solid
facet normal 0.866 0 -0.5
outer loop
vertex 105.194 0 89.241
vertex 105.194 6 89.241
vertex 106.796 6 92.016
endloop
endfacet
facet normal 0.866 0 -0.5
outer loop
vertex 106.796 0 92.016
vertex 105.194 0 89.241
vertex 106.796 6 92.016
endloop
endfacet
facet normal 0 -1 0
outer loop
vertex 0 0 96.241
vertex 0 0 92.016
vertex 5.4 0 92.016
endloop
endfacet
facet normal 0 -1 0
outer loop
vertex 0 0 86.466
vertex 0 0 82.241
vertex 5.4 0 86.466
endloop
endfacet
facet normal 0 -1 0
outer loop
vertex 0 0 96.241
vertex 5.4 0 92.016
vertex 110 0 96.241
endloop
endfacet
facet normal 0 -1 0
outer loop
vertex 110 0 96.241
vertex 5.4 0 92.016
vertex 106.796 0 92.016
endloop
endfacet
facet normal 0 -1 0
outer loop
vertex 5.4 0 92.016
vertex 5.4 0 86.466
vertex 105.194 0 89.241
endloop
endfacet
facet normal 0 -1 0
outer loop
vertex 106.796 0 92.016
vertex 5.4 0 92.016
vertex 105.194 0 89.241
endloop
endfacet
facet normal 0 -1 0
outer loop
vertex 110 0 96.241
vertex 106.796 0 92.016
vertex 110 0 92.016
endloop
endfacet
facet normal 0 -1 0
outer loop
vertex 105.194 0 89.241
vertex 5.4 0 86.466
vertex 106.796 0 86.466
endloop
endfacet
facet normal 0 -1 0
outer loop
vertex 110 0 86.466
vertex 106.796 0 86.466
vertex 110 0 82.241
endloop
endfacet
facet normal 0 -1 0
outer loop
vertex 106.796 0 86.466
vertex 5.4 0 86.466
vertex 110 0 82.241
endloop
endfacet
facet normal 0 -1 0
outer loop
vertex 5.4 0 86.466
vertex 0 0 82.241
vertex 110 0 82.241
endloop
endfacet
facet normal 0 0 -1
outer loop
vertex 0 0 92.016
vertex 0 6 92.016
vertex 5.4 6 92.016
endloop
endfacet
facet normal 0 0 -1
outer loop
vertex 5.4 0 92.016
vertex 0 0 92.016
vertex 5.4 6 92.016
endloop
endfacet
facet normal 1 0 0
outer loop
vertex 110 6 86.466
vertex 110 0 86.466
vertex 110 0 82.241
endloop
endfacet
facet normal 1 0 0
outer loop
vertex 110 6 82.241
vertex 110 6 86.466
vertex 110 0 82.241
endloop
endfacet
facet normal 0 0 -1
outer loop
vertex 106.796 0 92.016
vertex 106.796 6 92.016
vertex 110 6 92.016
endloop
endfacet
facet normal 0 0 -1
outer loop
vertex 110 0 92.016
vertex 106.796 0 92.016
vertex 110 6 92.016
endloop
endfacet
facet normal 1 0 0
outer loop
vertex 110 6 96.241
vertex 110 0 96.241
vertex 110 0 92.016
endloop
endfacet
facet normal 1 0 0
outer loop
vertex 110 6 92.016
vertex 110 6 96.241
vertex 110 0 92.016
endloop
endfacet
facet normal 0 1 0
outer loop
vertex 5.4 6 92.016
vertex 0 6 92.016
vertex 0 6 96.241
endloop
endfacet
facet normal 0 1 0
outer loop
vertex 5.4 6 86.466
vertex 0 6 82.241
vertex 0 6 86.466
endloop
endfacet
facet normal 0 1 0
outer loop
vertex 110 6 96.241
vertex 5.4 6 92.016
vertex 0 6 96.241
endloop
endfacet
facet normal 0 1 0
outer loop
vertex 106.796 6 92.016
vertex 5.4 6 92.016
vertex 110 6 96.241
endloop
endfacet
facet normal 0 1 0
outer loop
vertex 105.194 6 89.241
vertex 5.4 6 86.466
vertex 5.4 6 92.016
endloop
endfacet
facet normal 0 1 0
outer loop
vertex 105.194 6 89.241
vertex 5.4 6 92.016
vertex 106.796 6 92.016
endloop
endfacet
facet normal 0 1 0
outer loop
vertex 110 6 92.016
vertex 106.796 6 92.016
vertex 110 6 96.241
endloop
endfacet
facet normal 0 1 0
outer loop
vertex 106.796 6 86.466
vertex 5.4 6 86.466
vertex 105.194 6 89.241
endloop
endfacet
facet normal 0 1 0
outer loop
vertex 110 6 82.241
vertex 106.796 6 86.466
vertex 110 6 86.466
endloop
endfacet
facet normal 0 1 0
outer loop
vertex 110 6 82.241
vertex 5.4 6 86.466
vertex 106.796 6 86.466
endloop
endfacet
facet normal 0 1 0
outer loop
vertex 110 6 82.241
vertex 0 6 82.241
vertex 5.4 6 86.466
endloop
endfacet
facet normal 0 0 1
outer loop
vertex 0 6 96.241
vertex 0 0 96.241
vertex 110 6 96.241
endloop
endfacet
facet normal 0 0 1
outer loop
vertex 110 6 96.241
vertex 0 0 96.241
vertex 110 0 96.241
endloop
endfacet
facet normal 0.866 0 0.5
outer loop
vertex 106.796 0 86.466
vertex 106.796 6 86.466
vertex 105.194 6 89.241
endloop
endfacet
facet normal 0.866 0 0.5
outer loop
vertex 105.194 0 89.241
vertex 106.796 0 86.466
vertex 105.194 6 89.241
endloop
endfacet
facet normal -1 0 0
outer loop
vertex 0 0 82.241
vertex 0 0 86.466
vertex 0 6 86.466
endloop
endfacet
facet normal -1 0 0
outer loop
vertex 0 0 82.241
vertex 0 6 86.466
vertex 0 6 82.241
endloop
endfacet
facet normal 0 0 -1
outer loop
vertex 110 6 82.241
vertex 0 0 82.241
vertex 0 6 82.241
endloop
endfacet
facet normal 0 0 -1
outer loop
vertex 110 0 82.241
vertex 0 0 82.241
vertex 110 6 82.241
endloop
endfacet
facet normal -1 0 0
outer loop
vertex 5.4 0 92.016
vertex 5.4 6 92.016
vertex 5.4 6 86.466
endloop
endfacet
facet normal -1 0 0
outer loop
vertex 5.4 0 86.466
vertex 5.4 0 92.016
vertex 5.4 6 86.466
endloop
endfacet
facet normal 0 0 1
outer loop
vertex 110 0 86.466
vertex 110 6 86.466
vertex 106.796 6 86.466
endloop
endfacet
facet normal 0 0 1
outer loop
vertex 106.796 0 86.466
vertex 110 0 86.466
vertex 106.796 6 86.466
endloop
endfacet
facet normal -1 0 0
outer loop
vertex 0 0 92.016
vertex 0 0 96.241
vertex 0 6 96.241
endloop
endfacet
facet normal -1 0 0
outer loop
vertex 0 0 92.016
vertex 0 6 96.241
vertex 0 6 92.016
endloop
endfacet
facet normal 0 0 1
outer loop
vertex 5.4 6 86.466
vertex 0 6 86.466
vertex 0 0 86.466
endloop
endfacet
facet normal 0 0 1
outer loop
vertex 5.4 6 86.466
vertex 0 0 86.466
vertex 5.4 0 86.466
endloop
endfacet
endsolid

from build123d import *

# Parameters (mm, degrees)
SZKIC1_W                    = 110
SZKIC1_H                    = 14
DODANIE_WYCI_GNI_CIE1_DEPTH = 6
SZKIC2_W                    = 5.4
SZKIC2_H                    = 5.55
WYTNIJ_WYCI_GNI_CIE1_DEPTH  = 6
WYTNIJ_WYCI_GNI_CIE2_DEPTH  = 6


with BuildPart() as part:
    # Szkic1 → Dodanie-wyciągnięcie1 (new body)
    with BuildSketch(Plane(origin=(0, 0, 0), x_dir=(1, 0, 0), z_dir=(0, 1, 0))):
        with Locations((55, -89.241330813)):
            Rectangle(SZKIC1_W, SZKIC1_H)
    extrude(amount=DODANIE_WYCI_GNI_CIE1_DEPTH)

    # Szkic2 → Wytnij-wyciągnięcie1 (cut)
    with BuildSketch(Plane(origin=(0, 6, 0), x_dir=(1, 0, 0), z_dir=(0, 1, 0))):
        with Locations((2.7, -89.241330813)):
            Rectangle(SZKIC2_W, SZKIC2_H)
    extrude(amount=-WYTNIJ_WYCI_GNI_CIE1_DEPTH, mode=Mode.SUBTRACT)

    # Szkic3 → Wytnij-wyciągnięcie2 (cut)
    with BuildSketch(Plane(origin=(0, 6, 0), x_dir=(1, 0, 0), z_dir=(0, 1, 0))):
        Polygon((106.795706006, -92.016330813), (110, -92.016330813), (111.602146997, -89.241330813), (110, -86.466330813), (106.795706006, -86.466330813), (105.193559009, -89.241330813), align=None)
    extrude(amount=-WYTNIJ_WYCI_GNI_CIE2_DEPTH, mode=Mode.SUBTRACT)


solid = part.part
